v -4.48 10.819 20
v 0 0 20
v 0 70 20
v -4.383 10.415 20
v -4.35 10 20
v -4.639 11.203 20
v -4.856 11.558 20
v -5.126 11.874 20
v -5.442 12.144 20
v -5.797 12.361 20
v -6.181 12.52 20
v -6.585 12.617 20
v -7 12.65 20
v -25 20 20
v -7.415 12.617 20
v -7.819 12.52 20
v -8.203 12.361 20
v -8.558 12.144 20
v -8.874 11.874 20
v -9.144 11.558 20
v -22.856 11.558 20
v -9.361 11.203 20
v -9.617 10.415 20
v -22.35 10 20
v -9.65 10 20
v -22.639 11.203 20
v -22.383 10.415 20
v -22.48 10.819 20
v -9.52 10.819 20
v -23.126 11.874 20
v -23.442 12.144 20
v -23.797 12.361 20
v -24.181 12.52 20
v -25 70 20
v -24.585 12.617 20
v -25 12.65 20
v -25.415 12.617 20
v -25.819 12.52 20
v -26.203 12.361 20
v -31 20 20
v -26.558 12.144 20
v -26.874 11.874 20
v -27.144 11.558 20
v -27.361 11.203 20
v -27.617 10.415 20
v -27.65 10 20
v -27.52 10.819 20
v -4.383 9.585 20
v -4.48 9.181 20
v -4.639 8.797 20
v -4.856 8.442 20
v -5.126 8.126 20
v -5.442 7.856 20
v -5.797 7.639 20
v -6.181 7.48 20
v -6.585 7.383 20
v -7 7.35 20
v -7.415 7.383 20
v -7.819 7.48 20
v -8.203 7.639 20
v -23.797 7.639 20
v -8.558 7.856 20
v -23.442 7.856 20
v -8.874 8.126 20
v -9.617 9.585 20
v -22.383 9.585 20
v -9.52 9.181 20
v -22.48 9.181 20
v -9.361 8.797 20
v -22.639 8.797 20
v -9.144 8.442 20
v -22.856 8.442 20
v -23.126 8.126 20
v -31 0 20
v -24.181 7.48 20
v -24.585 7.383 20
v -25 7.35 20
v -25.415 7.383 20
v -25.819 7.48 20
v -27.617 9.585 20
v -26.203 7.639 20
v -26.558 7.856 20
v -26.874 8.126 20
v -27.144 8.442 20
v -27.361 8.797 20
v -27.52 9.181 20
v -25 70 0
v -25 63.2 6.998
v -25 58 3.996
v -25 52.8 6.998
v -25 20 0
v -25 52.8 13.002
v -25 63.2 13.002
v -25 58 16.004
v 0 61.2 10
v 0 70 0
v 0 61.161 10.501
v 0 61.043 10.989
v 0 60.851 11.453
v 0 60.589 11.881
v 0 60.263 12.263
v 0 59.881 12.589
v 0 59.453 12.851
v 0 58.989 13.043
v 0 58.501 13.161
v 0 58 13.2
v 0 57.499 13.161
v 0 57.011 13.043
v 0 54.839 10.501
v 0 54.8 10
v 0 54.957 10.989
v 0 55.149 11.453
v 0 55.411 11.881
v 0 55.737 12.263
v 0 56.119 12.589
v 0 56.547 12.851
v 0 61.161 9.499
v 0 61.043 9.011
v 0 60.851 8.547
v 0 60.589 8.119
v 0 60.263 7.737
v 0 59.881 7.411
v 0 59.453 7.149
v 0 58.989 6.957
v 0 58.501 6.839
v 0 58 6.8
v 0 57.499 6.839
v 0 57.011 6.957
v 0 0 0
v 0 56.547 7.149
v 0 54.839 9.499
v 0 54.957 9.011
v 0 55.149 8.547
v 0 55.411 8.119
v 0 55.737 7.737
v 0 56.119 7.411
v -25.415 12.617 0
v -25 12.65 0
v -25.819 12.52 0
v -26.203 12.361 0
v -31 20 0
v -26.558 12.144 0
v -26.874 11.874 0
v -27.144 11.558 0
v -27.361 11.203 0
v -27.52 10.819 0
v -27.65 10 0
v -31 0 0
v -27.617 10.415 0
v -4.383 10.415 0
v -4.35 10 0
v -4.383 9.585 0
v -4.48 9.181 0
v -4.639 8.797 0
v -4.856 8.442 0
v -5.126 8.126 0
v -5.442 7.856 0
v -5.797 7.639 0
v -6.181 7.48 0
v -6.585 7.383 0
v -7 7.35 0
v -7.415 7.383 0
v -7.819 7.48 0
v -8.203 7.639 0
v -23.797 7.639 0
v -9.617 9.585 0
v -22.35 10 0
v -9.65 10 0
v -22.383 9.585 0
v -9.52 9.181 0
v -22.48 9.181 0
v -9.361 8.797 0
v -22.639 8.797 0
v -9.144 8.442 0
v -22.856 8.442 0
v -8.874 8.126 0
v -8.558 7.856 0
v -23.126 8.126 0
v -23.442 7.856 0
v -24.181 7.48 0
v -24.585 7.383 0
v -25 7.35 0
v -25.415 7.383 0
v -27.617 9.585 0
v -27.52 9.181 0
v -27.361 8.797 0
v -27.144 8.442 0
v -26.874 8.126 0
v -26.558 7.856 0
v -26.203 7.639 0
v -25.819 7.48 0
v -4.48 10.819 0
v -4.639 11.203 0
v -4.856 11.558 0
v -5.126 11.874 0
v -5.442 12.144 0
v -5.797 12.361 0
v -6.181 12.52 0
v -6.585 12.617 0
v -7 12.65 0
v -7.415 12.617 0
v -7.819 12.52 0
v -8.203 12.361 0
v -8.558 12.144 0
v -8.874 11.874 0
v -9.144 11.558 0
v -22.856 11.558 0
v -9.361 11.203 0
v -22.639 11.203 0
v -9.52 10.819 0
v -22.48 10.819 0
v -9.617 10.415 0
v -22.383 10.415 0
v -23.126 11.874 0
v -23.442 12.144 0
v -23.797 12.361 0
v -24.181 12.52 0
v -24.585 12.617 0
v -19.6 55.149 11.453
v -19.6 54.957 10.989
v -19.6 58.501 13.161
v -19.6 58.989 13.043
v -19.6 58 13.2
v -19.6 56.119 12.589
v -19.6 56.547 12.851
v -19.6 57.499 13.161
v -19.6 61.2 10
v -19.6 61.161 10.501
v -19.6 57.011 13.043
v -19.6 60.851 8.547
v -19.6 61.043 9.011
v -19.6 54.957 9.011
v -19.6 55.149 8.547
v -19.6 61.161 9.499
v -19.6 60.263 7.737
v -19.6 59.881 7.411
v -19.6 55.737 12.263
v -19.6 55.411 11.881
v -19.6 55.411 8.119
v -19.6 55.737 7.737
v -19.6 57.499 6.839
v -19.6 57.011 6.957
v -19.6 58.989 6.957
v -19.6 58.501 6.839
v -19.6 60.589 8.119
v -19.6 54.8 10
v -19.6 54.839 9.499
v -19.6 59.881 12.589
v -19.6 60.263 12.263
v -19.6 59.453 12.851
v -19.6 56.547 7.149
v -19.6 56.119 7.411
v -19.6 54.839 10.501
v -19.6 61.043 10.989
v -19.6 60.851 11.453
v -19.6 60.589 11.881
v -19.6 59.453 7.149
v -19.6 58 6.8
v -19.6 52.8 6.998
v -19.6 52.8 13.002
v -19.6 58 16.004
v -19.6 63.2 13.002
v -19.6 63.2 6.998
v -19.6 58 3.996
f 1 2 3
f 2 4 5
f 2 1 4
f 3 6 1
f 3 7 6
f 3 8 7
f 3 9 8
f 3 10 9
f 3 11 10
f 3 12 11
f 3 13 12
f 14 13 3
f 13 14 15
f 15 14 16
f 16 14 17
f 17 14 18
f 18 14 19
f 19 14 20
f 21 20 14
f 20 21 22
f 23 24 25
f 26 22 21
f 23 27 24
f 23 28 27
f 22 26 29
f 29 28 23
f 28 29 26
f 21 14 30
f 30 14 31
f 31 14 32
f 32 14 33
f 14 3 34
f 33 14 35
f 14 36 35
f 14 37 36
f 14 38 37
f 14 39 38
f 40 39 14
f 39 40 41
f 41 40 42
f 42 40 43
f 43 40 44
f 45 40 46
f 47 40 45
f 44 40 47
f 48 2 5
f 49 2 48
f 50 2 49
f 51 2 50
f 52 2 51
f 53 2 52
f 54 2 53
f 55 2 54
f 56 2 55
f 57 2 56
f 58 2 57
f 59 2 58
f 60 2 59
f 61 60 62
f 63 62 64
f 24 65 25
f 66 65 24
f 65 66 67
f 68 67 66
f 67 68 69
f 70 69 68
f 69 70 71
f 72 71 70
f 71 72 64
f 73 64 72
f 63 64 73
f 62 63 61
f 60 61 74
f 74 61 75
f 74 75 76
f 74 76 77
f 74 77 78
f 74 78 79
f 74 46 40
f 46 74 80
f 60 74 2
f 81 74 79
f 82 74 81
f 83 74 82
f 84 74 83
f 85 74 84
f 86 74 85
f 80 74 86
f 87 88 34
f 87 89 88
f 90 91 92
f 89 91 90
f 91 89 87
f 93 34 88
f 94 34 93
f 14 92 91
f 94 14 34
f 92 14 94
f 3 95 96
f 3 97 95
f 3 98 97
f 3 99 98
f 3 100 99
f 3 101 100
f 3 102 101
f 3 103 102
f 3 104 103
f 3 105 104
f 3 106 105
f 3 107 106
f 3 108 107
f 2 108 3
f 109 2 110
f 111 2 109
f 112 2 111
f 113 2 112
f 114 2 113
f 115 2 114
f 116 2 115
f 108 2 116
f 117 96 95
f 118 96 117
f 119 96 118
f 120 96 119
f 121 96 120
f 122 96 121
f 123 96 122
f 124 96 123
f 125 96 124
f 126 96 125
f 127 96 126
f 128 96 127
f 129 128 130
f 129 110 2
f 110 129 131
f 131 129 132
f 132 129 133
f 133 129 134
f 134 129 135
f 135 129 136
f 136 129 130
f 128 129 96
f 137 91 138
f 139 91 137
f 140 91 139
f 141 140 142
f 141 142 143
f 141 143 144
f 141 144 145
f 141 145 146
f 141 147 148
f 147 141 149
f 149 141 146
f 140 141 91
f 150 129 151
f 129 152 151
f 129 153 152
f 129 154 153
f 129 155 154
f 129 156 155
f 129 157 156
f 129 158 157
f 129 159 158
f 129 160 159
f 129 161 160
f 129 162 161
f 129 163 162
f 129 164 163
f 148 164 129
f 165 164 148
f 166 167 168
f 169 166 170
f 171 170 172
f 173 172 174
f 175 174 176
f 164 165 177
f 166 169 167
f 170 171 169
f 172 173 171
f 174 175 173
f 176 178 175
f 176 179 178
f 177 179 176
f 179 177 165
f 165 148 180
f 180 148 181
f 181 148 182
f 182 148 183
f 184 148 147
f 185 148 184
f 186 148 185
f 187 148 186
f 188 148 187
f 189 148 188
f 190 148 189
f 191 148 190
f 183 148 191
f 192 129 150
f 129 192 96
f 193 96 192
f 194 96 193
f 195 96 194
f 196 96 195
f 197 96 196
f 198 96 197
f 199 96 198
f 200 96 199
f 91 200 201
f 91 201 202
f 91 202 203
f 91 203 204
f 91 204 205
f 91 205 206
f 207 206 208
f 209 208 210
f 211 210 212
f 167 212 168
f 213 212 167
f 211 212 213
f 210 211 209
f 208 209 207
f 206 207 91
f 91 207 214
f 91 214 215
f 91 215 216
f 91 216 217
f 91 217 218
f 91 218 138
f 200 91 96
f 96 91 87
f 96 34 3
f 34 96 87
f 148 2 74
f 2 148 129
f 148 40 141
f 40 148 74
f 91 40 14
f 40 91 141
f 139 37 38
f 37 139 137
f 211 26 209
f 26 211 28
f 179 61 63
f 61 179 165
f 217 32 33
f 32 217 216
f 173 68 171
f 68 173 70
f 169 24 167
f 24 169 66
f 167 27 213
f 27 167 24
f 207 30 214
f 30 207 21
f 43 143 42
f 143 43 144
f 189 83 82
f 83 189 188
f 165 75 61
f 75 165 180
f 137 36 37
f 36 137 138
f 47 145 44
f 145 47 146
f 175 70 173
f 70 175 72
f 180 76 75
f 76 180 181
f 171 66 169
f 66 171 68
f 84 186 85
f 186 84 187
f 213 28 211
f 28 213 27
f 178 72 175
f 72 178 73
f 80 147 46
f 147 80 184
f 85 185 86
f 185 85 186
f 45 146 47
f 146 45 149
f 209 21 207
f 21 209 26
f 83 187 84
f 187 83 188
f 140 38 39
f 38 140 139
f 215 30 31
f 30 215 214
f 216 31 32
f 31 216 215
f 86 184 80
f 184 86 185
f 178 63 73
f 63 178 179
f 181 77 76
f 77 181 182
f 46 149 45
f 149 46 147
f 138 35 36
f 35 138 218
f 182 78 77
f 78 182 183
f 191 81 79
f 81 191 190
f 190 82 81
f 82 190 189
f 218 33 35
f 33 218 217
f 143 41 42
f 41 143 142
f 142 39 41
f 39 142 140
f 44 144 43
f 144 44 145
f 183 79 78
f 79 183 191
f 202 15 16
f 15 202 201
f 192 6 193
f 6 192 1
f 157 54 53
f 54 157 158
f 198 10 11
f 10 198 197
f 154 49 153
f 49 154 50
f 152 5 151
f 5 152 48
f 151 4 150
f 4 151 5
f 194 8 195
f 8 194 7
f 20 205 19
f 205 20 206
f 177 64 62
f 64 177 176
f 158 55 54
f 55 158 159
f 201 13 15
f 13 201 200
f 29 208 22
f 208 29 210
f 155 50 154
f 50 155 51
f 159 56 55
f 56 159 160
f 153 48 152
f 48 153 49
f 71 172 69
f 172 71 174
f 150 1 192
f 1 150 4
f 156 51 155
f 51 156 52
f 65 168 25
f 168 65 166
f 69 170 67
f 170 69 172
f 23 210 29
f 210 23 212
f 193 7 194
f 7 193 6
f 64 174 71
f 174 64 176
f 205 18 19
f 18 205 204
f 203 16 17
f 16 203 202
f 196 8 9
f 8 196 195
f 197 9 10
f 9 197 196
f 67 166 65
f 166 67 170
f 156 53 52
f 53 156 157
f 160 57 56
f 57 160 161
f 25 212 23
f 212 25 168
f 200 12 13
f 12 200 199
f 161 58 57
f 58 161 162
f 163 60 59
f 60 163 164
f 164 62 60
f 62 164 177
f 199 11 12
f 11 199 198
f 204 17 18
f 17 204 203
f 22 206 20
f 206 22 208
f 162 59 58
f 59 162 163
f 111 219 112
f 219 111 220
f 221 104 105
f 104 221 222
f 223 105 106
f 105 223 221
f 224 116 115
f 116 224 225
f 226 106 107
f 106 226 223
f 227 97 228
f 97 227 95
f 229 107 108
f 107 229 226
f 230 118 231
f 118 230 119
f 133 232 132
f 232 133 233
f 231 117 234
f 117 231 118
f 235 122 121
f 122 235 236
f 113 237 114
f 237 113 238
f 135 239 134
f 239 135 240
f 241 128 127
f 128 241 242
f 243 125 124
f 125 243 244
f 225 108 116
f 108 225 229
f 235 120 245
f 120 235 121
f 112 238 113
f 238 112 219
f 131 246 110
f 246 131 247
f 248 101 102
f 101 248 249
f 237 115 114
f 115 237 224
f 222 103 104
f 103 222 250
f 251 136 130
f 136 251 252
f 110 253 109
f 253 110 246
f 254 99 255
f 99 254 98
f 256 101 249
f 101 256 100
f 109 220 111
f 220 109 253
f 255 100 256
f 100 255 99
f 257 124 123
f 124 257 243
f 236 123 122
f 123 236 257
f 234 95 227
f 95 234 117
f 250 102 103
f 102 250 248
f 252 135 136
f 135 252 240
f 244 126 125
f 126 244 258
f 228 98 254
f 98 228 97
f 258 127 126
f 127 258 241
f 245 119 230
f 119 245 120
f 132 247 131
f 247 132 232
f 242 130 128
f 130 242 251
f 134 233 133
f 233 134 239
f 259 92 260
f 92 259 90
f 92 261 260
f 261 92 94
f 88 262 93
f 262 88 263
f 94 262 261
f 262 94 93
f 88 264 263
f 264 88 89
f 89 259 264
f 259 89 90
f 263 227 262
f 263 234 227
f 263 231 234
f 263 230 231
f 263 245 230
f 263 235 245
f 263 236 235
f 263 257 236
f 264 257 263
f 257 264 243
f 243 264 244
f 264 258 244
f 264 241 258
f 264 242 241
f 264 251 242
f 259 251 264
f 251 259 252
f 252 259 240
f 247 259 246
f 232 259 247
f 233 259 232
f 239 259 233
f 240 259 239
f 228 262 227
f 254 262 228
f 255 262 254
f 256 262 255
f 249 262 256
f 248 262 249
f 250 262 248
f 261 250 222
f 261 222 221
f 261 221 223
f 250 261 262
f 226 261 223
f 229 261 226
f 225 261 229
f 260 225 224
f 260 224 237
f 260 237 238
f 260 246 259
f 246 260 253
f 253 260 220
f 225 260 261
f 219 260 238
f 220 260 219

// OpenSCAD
// Frame clamp foot
//
// Screwed onto the side of a frame hanger in front of the desk edge (two M5
// into T-nuts in the hanger's side slot), its arm reaches back under the
// desk top. An M6 nut sits in the pocket on top of the arm; an M6 x 40
// thumb screw from below goes through it and presses up against the desk
// underside, so the frame is clamped onto the desk edge. Four of them, one
// per hanger. The shape and its values are in frame.inc.scad.
//
// Print on its side (flat x face on the bed), so the layers run along the
// arm.

include <frame.inc.scad>

$fn = 40;

rotate([0, -90, 0]) translate([0, 0, -foot_z0]) clamp_foot(); // Make module foot
